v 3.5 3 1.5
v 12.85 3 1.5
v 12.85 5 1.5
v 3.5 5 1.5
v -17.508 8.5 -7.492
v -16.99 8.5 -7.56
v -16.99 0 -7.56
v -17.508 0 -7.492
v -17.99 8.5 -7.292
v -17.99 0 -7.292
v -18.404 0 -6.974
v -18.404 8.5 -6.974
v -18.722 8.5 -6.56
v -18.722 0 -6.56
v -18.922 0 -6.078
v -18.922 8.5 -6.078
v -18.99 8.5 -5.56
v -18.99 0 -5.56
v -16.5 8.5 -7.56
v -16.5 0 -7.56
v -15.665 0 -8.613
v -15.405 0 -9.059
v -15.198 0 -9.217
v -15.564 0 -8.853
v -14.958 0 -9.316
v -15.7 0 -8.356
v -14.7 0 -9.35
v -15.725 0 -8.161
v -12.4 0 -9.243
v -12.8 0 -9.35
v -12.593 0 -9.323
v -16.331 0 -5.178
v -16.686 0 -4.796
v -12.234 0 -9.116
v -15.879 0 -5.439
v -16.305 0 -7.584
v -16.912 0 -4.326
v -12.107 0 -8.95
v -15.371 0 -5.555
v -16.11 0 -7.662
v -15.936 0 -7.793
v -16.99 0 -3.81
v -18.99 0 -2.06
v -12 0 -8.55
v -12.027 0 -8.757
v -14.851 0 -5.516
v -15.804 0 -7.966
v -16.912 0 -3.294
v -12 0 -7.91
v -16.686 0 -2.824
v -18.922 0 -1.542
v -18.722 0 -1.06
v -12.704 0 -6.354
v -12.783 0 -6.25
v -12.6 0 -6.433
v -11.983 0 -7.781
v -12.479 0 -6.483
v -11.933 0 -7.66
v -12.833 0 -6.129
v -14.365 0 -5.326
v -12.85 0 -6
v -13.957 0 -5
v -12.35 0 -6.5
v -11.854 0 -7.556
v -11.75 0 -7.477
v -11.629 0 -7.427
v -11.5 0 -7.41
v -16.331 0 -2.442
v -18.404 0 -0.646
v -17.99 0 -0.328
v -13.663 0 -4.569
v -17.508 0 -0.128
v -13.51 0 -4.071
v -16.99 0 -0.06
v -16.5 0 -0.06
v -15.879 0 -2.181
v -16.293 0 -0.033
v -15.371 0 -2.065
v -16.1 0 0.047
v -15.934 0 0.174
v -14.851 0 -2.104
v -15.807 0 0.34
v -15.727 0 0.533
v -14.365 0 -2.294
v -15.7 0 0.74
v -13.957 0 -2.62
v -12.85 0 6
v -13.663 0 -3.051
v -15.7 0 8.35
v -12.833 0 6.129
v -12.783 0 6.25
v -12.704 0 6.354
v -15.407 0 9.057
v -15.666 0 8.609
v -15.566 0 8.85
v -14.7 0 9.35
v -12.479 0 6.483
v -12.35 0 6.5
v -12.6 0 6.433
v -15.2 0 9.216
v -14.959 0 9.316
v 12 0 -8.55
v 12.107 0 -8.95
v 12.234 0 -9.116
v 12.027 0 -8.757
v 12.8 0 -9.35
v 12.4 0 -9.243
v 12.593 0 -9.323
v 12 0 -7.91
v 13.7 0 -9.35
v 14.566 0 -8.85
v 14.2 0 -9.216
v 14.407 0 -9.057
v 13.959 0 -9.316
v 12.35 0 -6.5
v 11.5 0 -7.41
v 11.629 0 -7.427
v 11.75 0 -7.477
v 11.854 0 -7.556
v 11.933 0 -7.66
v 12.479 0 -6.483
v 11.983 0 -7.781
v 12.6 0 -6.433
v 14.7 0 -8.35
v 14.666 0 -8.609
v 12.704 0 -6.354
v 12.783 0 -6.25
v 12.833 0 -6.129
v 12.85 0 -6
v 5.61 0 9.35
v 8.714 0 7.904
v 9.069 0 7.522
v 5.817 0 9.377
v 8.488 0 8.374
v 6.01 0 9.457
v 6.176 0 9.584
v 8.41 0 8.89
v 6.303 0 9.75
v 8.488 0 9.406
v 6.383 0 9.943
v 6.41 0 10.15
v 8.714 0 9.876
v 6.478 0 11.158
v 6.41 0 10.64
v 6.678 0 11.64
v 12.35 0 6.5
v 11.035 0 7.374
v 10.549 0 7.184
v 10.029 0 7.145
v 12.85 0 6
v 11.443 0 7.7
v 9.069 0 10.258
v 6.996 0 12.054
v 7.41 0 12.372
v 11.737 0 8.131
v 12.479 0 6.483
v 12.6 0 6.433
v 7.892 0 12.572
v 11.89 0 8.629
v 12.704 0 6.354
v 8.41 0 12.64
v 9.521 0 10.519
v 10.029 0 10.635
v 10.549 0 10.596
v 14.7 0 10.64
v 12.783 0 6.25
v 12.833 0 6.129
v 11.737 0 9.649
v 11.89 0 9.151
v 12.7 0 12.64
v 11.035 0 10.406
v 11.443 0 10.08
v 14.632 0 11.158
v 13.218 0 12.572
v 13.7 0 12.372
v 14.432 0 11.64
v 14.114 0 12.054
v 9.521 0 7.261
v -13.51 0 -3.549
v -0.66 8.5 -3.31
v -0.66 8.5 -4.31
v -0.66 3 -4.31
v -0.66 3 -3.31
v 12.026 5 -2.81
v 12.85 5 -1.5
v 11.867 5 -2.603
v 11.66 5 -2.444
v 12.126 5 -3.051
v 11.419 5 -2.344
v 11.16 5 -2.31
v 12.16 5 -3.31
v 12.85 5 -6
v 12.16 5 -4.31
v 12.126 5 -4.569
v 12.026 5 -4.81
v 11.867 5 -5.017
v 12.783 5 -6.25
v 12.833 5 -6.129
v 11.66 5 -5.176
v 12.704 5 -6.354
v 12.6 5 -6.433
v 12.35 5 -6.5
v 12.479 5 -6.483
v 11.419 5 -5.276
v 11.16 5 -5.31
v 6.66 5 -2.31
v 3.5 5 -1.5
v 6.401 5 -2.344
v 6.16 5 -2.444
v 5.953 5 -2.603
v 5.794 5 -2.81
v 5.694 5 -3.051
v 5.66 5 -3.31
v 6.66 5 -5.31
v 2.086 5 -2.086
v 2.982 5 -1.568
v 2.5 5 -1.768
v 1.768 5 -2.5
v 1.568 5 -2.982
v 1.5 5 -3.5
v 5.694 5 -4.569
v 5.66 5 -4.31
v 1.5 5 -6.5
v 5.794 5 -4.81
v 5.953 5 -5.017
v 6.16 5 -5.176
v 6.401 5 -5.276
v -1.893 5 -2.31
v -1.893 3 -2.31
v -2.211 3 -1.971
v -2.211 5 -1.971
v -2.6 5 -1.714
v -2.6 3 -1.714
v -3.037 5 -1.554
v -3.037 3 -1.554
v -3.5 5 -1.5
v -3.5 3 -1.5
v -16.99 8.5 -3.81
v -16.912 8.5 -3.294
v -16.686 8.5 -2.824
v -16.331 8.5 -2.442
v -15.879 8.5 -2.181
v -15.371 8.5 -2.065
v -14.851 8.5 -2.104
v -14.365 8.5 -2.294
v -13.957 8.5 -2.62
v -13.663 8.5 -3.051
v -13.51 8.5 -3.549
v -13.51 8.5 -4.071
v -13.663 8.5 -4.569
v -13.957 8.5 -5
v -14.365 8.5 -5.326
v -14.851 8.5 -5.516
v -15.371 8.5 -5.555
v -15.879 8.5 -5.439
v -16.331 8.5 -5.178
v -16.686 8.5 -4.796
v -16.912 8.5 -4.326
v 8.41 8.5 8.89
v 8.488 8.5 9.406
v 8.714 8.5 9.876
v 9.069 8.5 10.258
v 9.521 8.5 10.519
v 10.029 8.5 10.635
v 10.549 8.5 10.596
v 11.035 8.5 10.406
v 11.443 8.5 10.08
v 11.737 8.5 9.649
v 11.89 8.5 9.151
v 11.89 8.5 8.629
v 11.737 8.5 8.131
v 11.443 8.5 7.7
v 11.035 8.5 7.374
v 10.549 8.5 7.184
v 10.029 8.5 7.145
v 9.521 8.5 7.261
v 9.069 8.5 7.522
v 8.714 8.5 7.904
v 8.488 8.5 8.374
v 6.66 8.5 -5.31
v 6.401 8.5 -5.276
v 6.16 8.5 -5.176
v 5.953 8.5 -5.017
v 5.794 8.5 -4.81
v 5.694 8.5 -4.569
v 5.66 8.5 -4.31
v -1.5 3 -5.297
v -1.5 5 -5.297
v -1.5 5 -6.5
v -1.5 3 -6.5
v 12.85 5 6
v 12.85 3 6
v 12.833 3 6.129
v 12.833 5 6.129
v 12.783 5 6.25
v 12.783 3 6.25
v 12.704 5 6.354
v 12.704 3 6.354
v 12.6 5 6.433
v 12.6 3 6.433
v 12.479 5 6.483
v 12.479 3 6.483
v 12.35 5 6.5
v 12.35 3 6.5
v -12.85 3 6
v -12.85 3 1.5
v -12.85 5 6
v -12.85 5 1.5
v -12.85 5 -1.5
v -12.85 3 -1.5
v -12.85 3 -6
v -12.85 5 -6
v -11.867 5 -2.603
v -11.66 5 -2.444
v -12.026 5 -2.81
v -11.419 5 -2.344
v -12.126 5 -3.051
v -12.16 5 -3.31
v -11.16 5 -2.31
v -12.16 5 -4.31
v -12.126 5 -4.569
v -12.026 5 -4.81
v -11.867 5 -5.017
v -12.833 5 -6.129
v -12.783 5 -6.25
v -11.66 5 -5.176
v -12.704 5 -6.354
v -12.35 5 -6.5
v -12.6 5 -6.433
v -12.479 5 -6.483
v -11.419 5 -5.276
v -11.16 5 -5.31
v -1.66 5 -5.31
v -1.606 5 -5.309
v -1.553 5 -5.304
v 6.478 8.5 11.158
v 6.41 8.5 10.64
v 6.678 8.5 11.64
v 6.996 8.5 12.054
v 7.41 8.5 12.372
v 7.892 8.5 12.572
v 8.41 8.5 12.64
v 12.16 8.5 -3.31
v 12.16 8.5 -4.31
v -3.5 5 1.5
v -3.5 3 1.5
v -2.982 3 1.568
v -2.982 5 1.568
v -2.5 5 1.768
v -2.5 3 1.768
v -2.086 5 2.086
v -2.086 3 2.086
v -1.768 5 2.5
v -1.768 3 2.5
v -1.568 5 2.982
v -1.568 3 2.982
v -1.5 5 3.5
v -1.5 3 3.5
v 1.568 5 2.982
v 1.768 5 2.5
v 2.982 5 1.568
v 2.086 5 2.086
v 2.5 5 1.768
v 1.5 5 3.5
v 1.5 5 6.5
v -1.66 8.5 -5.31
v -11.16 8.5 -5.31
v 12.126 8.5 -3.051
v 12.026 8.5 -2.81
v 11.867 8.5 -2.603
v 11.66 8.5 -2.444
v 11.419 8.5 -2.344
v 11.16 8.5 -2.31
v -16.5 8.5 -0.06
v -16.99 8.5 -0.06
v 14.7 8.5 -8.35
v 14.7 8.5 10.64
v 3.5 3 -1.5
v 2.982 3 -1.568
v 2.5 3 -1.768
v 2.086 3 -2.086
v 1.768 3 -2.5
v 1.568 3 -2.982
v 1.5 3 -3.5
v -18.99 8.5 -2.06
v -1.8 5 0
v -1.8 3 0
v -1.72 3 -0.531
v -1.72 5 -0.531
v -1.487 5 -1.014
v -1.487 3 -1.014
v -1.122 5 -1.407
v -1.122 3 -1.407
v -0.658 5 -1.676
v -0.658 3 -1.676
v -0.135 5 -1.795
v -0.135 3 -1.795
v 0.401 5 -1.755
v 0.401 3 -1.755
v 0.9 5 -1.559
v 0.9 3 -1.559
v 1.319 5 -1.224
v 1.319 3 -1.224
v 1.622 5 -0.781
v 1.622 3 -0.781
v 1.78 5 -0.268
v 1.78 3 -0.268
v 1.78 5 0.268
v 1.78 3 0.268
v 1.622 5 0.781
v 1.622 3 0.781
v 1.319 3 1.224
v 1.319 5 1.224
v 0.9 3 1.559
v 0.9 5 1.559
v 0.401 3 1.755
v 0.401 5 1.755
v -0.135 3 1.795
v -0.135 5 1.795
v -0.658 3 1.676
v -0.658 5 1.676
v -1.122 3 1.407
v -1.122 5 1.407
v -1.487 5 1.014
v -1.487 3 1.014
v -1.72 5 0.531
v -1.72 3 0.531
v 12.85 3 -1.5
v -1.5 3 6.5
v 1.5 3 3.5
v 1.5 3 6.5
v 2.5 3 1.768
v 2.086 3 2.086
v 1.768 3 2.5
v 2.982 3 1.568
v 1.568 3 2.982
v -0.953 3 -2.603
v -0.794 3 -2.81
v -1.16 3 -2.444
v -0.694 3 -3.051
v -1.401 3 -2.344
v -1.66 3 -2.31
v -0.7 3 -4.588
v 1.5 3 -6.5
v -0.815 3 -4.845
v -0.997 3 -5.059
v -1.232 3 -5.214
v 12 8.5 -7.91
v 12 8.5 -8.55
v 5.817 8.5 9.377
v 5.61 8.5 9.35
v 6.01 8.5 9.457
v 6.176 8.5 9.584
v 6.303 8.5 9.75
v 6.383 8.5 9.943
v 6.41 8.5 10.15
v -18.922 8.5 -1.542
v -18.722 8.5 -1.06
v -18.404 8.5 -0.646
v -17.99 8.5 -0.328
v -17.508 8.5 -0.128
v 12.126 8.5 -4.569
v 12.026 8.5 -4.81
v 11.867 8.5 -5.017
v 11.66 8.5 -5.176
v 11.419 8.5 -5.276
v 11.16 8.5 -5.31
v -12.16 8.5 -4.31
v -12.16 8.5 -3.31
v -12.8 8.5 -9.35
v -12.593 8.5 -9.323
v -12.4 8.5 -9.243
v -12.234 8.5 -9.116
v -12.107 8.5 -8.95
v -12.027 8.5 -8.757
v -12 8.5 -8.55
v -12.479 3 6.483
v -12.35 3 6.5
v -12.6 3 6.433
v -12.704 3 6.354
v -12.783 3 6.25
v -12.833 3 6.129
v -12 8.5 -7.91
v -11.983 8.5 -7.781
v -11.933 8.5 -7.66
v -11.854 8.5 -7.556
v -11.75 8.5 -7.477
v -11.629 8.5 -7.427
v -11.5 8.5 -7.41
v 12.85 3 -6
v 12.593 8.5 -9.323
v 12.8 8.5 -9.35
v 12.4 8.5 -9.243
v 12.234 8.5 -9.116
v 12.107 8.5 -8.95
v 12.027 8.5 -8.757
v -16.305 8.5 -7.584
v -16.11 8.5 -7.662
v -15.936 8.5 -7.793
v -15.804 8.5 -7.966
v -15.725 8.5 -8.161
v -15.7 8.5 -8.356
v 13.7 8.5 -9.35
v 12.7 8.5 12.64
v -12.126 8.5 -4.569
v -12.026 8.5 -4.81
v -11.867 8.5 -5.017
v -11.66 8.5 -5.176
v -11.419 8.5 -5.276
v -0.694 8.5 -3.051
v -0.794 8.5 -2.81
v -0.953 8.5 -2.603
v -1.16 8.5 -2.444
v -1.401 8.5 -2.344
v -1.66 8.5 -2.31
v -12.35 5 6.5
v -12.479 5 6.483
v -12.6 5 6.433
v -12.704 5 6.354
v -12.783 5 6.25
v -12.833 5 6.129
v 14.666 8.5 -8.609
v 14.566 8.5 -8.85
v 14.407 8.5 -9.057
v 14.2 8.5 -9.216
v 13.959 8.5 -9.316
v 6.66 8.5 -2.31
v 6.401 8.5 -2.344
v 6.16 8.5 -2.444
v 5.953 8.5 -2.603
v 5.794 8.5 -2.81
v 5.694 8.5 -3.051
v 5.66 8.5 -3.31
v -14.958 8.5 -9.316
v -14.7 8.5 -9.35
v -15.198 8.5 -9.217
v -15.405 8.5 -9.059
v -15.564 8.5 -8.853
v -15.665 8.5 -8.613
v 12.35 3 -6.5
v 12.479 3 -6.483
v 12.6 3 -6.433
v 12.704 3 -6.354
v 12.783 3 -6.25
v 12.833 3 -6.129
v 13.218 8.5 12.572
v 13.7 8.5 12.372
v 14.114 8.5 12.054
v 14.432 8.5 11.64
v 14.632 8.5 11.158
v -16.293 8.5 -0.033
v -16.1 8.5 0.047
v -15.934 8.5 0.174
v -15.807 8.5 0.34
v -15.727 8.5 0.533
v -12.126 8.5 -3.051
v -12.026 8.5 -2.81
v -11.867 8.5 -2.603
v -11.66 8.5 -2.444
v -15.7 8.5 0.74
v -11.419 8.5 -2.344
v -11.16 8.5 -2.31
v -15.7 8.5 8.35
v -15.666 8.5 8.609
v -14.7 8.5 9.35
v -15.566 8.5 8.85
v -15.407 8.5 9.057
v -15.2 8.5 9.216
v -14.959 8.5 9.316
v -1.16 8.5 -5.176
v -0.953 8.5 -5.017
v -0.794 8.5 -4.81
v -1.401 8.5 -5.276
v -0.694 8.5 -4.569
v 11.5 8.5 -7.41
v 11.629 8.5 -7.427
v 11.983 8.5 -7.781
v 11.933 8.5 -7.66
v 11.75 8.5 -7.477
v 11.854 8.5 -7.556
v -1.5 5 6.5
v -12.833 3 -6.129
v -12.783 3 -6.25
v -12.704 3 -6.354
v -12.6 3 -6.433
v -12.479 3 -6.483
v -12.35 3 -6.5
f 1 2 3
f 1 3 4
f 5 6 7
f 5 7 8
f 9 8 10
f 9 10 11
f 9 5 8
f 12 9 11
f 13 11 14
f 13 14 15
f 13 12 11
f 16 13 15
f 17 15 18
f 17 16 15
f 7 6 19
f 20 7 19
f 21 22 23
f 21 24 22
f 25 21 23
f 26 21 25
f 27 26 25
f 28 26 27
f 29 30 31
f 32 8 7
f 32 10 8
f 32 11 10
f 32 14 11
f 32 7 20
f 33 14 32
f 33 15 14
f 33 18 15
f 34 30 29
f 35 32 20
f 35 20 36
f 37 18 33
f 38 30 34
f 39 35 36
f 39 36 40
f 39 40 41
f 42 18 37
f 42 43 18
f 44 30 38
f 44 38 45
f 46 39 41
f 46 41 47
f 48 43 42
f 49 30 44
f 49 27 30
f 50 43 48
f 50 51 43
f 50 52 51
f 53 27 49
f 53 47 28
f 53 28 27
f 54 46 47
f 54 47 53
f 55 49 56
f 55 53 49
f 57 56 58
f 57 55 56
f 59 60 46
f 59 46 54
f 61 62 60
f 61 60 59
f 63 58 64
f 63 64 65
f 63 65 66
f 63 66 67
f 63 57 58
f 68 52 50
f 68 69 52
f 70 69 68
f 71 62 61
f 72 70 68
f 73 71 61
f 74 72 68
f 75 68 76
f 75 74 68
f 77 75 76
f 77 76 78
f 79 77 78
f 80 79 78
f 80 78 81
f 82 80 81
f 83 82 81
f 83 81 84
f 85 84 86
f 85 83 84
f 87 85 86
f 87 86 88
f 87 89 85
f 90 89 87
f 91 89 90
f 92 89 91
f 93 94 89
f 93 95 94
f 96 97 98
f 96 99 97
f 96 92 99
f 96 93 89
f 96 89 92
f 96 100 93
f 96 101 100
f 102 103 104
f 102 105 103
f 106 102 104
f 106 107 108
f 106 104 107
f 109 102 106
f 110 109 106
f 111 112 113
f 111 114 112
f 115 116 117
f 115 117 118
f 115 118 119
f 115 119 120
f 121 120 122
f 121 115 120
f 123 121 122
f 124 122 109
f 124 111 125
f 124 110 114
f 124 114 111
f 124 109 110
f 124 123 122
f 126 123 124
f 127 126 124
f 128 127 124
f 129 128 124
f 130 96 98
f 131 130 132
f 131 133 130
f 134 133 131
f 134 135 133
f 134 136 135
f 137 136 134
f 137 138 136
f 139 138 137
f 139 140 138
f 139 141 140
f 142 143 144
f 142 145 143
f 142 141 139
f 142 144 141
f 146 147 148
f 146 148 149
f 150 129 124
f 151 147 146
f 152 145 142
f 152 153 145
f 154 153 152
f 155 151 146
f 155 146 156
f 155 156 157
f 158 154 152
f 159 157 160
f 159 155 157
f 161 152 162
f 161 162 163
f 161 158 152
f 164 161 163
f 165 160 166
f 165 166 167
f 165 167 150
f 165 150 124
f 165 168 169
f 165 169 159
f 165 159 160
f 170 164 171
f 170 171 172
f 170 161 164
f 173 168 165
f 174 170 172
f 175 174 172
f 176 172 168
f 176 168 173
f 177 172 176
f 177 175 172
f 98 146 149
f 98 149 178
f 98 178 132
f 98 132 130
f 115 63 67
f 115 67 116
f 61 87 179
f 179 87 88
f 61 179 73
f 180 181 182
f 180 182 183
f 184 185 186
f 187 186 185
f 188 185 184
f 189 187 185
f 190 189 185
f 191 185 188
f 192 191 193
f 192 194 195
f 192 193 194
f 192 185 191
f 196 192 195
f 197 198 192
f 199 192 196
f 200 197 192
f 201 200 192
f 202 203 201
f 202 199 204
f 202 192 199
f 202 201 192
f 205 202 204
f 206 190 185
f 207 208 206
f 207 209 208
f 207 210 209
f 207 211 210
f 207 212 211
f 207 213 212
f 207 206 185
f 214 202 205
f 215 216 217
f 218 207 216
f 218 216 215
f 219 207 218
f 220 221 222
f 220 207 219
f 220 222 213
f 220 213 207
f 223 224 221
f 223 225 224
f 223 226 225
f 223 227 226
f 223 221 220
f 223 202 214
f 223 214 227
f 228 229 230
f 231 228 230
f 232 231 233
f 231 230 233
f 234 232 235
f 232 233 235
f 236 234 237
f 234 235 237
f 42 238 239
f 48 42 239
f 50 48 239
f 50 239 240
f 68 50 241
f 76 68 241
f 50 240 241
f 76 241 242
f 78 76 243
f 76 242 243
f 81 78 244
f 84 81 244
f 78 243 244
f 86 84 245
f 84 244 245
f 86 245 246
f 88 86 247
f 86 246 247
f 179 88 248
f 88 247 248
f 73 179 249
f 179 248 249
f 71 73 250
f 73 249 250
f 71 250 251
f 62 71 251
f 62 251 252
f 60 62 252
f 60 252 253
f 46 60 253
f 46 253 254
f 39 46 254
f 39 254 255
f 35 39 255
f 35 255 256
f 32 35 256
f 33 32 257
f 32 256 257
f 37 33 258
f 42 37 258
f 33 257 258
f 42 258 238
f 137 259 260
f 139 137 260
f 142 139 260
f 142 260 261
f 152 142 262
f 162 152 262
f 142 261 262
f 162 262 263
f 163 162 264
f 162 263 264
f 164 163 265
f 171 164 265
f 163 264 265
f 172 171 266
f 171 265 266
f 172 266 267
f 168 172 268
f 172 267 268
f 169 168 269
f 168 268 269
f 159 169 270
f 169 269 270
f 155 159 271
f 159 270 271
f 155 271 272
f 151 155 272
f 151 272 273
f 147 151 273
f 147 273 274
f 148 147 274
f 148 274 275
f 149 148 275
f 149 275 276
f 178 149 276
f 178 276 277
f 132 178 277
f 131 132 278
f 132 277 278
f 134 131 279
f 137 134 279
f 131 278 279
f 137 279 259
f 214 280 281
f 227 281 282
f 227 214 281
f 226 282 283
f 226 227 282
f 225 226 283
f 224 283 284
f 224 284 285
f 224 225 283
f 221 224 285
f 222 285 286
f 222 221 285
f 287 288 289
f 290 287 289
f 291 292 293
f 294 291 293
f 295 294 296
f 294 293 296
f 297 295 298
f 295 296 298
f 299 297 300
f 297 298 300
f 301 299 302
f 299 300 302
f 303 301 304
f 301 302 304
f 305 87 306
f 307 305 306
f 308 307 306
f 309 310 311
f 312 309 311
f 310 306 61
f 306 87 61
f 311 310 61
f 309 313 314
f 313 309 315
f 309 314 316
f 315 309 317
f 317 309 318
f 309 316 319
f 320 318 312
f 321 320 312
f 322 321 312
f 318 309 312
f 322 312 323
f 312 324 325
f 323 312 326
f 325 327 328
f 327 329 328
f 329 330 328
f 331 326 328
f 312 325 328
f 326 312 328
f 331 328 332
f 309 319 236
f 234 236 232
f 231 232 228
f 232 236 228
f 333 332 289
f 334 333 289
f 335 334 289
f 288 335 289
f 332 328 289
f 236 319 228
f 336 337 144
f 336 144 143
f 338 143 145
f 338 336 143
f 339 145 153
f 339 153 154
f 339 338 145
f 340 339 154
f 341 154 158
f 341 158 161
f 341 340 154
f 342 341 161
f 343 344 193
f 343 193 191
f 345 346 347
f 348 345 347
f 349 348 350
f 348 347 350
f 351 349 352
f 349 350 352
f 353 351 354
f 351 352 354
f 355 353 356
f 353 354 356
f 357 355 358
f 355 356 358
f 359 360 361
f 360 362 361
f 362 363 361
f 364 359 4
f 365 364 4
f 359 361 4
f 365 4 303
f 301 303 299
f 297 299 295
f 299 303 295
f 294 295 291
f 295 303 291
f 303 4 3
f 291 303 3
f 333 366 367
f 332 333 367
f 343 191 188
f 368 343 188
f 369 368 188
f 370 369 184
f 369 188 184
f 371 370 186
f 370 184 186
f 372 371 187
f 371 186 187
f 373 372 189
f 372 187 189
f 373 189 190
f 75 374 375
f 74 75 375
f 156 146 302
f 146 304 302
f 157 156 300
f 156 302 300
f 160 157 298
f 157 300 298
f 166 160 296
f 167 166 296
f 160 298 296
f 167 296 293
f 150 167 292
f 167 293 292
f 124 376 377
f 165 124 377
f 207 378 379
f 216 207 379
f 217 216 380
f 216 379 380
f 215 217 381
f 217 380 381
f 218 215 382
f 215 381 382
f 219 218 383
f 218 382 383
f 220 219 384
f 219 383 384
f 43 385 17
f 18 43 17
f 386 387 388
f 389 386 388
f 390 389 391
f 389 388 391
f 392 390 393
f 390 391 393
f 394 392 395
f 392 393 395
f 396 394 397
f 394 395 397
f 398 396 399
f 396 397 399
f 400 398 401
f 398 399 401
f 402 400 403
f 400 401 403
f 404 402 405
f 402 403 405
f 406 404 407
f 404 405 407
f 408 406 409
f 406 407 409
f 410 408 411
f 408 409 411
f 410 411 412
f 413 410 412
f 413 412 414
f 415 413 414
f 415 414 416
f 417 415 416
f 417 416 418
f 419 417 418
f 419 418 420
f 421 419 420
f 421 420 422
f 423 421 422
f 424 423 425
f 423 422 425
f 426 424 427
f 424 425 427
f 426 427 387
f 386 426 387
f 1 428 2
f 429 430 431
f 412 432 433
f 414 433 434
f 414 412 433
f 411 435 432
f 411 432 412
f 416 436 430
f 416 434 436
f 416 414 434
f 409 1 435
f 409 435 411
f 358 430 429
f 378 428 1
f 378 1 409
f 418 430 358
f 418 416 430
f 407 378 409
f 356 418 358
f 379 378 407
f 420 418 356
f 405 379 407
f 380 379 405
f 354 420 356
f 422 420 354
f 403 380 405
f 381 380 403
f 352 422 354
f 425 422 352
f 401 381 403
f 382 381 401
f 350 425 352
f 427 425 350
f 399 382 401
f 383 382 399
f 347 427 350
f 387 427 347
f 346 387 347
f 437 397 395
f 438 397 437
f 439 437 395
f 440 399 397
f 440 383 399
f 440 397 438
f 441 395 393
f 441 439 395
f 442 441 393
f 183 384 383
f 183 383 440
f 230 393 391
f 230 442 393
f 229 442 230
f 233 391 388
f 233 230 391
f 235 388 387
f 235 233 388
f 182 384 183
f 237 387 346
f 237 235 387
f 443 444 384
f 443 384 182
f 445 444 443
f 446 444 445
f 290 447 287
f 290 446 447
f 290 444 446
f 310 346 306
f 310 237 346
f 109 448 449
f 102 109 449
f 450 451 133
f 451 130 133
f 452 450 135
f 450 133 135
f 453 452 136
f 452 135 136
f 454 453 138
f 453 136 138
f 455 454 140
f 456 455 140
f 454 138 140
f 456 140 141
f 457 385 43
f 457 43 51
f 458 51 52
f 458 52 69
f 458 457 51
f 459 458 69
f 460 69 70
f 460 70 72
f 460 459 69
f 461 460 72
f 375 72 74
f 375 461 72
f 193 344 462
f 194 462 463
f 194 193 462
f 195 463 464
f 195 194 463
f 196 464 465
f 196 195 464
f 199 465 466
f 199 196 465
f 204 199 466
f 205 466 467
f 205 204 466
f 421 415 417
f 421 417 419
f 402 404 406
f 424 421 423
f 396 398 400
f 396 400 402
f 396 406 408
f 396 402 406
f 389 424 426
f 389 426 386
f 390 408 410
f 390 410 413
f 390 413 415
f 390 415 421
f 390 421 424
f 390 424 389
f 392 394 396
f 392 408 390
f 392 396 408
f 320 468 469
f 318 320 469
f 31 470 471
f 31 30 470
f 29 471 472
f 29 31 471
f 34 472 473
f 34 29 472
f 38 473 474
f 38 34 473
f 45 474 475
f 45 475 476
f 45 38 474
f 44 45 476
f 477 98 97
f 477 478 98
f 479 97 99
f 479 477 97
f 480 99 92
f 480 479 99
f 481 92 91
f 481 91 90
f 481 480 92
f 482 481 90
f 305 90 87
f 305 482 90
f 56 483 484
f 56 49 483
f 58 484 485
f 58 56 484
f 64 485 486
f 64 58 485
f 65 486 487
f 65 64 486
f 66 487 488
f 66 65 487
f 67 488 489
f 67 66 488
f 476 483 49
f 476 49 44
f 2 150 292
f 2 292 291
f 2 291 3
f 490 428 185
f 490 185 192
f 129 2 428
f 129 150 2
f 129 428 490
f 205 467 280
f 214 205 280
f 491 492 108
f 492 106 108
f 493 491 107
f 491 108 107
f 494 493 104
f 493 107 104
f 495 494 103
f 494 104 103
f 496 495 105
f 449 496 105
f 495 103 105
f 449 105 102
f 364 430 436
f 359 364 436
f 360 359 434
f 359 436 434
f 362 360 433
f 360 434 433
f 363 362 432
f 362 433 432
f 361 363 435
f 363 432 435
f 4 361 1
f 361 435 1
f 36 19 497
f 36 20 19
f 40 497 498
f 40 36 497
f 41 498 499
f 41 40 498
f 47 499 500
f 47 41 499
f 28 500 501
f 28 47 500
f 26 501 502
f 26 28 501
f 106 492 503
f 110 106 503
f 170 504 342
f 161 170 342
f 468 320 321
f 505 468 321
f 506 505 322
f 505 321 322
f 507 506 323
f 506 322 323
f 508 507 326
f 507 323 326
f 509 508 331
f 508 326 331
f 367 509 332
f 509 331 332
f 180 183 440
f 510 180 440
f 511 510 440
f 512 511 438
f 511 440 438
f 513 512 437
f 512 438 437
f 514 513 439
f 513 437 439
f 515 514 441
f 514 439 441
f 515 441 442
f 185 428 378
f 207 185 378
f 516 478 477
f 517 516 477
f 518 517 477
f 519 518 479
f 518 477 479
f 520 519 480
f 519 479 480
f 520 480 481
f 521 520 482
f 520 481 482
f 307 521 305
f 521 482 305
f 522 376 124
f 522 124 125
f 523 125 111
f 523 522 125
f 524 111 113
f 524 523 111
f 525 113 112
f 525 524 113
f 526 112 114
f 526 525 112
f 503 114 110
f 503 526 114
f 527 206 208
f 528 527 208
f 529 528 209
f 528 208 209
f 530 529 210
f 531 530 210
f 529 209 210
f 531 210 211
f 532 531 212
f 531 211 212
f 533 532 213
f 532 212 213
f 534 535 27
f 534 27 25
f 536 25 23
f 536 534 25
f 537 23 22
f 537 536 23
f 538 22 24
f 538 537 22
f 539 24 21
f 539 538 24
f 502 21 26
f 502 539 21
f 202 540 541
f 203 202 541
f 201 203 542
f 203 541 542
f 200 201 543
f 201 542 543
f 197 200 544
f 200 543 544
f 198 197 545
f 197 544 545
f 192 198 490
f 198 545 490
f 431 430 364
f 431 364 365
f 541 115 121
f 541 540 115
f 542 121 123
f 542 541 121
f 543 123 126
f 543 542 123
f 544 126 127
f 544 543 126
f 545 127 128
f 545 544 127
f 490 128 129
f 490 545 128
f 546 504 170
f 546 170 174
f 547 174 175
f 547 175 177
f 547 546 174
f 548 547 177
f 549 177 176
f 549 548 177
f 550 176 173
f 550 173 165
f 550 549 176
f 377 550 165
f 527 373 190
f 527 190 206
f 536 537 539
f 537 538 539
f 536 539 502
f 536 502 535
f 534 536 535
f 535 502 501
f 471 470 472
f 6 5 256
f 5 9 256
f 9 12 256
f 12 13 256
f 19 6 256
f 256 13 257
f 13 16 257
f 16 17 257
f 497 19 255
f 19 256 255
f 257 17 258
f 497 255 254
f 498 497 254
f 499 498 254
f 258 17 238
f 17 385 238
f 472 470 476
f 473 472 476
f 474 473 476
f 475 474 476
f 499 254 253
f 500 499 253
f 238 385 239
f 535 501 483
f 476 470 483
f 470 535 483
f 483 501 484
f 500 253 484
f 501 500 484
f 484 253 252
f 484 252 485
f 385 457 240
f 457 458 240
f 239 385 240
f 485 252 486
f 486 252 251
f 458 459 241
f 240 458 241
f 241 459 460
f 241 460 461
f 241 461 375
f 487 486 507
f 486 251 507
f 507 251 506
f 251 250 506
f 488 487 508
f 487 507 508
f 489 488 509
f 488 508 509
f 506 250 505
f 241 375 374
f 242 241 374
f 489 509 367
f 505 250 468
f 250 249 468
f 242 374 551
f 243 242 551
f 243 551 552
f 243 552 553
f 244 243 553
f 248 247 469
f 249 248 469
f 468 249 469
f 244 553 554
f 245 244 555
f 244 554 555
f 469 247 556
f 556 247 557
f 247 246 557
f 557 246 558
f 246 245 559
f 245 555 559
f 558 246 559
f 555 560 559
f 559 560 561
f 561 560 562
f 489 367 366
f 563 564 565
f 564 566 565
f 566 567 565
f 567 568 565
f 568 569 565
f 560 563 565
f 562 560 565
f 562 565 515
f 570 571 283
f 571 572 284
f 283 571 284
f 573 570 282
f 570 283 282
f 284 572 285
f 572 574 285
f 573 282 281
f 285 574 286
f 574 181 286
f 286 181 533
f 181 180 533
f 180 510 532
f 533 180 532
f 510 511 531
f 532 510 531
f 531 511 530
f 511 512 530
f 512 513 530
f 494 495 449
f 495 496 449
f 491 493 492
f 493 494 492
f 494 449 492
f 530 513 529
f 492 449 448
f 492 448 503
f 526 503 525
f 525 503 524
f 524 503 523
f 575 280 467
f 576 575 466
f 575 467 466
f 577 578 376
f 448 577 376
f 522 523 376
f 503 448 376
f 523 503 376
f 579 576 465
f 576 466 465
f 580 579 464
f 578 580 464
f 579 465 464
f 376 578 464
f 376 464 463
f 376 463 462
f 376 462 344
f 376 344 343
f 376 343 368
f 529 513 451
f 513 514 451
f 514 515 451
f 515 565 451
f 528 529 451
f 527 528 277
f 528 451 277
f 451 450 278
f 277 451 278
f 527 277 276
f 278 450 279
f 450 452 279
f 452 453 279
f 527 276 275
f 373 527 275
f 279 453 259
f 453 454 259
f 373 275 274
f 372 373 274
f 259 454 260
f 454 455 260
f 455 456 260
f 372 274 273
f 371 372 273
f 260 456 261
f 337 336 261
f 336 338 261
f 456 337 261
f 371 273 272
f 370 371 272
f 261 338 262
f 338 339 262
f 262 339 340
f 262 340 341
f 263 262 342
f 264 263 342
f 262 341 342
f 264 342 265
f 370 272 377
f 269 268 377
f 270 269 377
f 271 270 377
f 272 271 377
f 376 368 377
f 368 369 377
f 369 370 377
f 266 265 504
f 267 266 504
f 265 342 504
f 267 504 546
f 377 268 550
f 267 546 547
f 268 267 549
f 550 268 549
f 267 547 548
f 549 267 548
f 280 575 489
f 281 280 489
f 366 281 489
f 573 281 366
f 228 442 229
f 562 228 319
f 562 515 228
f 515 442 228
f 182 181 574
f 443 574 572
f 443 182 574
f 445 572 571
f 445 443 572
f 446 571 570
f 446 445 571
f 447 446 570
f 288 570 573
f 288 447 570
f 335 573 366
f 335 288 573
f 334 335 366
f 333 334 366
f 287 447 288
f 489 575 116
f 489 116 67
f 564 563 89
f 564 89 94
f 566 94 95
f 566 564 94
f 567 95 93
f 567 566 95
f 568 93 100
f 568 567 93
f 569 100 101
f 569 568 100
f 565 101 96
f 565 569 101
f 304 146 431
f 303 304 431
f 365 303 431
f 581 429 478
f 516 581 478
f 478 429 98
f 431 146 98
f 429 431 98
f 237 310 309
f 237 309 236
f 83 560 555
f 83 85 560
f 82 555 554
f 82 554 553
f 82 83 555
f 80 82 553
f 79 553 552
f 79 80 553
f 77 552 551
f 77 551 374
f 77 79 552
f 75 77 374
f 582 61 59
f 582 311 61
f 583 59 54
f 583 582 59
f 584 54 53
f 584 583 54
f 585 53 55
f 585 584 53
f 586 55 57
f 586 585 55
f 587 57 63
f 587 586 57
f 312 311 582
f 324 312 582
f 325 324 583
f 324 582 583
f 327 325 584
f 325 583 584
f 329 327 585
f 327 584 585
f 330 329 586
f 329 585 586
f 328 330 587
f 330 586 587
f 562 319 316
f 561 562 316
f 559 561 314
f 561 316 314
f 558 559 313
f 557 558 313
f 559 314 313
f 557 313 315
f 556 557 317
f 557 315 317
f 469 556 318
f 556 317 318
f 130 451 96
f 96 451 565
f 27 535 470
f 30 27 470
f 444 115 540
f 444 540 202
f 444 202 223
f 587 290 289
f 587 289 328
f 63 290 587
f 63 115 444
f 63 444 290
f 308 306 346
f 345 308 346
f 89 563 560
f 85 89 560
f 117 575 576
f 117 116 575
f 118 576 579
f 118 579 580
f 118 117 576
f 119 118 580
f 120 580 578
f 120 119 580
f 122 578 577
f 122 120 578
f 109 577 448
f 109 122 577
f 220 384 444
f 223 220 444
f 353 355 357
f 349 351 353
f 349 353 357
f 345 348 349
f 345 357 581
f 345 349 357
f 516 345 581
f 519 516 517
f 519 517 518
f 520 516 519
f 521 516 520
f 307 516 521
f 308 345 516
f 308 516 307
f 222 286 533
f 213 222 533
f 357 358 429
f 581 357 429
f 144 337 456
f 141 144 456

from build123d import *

# Parameters (mm, degrees)
SKETCH006_R             = 1.75
SKETCH006_W             = 6.5
SKETCH006_H             = 3
SKETCH006_W_2           = 11.5
PAD001_DEPTH            = 8.5
FILLET004_R             = 1
FILLET005_R             = 0.8
FILLET006_R             = 0.5
SKETCH007_W             = 25.7
SKETCH007_H             = 13
POCKET002_DEPTH         = 3
FILLET007_R             = 0.5
SKETCH008_R             = 1.8
POCKET003_DEPTH         = 2
BODY001_PLACEMENT_ANGLE = 180


with BuildPart() as part:
    # Sketch006 → Pad001 (new body)
    with BuildSketch(Plane.XZ):
        with BuildLine():
            Line((15.7, 8.35), (15.7, -0.06))
            Line((15.7, -0.06), (16.99, -0.06))
            ThreePointArc((18.99, -2.06), (18.404214, -0.645786), (16.99, -0.06))
            Line((18.99, -2.06), (18.99, -5.56))
            ThreePointArc((16.99, -7.56), (18.404214, -6.974214), (18.99, -5.56))
            Line((16.99, -7.56), (15.7, -7.56))
            Line((15.7, -8.35), (15.7, -7.56))
            ThreePointArc((14.7, -9.35), (15.407107, -9.057107), (15.7, -8.35))
            Line((14.7, -9.35), (12, -9.35))
            Line((12, -7.41), (12, -9.35))
            Line((-12, -7.41), (12, -7.41))
            Line((-12, -7.41), (-12, -9.35))
            Line((-12, -9.35), (-13.7, -9.35))
            ThreePointArc((-14.7, -8.35), (-14.407107, -9.057107), (-13.7, -9.35))
            Line((-14.7, -8.35), (-14.7, 10.64))
            ThreePointArc((-12.7, 12.64), (-14.114214, 12.054214), (-14.7, 10.64))
            Line((-12.7, 12.64), (-8.41, 12.64))
            ThreePointArc((-6.41, 10.64), (-6.995786, 12.054214), (-8.41, 12.64))
            Line((-6.41, 10.64), (-6.41, 9.35))
            Line((-6.41, 9.35), (14.7, 9.35))
            ThreePointArc((15.7, 8.35), (15.407107, 9.057107), (14.7, 9.35))
        make_face()
        with Locations((-10.16, 8.89)):
            Circle(SKETCH006_R, mode=Mode.SUBTRACT)
        with Locations((15.24, -3.81)):
            Circle(SKETCH006_R, mode=Mode.SUBTRACT)
        with Locations((-8.91, -3.81)):
            Rectangle(SKETCH006_W, SKETCH006_H, mode=Mode.SUBTRACT)
        with Locations((6.41, -3.81)):
            Rectangle(SKETCH006_W_2, SKETCH006_H, mode=Mode.SUBTRACT)
    extrude(amount=-PAD001_DEPTH)

    # Fillet004
    fillet004_edges = [part.edges().sort_by_distance(p)[0] for p in [
        (12.16, 4.25, -2.31),
        (0.66, 4.25, -2.31),
        (-12.16, 4.25, -2.31),
        (-5.66, 4.25, -2.31),
        (12.16, 4.25, -5.31),
        (-5.66, 4.25, -5.31),
        (-12.16, 4.25, -5.31),
        (0.66, 4.25, -5.31),
    ]]
    fillet(fillet004_edges, radius=FILLET004_R)

    # Fillet005
    fillet005_edges = [part.edges().sort_by_distance(p)[0] for p in [
        (15.7, 4.25, -7.56),
        (15.7, 4.25, -0.06),
        (-6.41, 4.25, 9.35),
        (12, 4.25, -9.35),
        (-12, 4.25, -9.35),
    ]]
    fillet(fillet005_edges, radius=FILLET005_R)

    # Fillet006
    fillet006_edges = [part.edges().sort_by_distance(p)[0] for p in [
        (-12, 4.25, -7.41),
        (12, 4.25, -7.41),
    ]]
    fillet(fillet006_edges, radius=FILLET006_R)

    # Sketch007 (on Face47 of Fillet006) → Pocket002 (cut)
    with BuildSketch(Plane(origin=(0, 8.5, 0), x_dir=(1, 0, 0), z_dir=(0, 1, 0))):
        Rectangle(SKETCH007_W, SKETCH007_H)
    extrude(amount=-POCKET002_DEPTH, mode=Mode.SUBTRACT)

    # Fillet007
    fillet007_edges = [part.edges().sort_by_distance(p)[0] for p in [
        (12.85, 7, 6.5),
        (12.85, 7, -6.5),
        (-12.85, 7, 6.5),
        (-12.85, 7, -6.5),
    ]]
    fillet(fillet007_edges, radius=FILLET007_R)

    # Sketch008 (on Face39 of Fillet007) → Pocket003 (cut)
    with BuildSketch(Plane(origin=(0, 5.5, 0), x_dir=(1, 0, 0), z_dir=(0, 1, 0))):
        Circle(SKETCH008_R)
        with BuildLine():
            Line((1.5, -6.5), (12.35, -6.5))
            ThreePointArc((12.35, -6.5), (12.703553, -6.353553), (12.85, -6))
            Line((12.85, -6), (12.85, -1.5))
            Line((12.85, -1.5), (3.5, -1.5))
            ThreePointArc((3.5, -1.5), (2.085786, -2.085786), (1.5, -3.5))
            Line((1.5, -3.5), (1.5, -6.5))
        make_face()
        with BuildLine():
            Line((-1.5, -6.5), (-12.35, -6.5))
            ThreePointArc((-12.85, -6), (-12.703553, -6.353553), (-12.35, -6.5))
            Line((-12.85, -6), (-12.85, -1.5))
            Line((-12.85, -1.5), (-3.5, -1.5))
            ThreePointArc((-1.5, -3.5), (-2.085786, -2.085786), (-3.5, -1.5))
            Line((-1.5, -3.5), (-1.5, -6.5))
        make_face()
        with BuildLine():
            Line((-1.5, 6.5), (-12.35, 6.5))
            ThreePointArc((-12.35, 6.5), (-12.703553, 6.353553), (-12.85, 6))
            Line((-12.85, 6), (-12.85, 1.5))
            Line((-12.85, 1.5), (-3.5, 1.5))
            ThreePointArc((-3.5, 1.5), (-2.085786, 2.085786), (-1.5, 3.5))
            Line((-1.5, 3.5), (-1.5, 6.5))
        make_face()
        with BuildLine():
            Line((1.5, 6.5), (12.35, 6.5))
            ThreePointArc((12.85, 6), (12.703553, 6.353553), (12.35, 6.5))
            Line((12.85, 6), (12.85, 1.5))
            Line((12.85, 1.5), (3.5, 1.5))
            ThreePointArc((1.5, 3.5), (2.085786, 2.085786), (3.5, 1.5))
            Line((1.5, 3.5), (1.5, 6.5))
        make_face()
    extrude(amount=-POCKET003_DEPTH, mode=Mode.SUBTRACT)


with BuildPart() as part_1:
    # Body001 placement: moved
    add(part.part.moved(Location((0, 8.5, 0))).rotate(Axis((0, 8.5, 0), (0, 0, 1)), BODY001_PLACEMENT_ANGLE))


solid = part_1.part
